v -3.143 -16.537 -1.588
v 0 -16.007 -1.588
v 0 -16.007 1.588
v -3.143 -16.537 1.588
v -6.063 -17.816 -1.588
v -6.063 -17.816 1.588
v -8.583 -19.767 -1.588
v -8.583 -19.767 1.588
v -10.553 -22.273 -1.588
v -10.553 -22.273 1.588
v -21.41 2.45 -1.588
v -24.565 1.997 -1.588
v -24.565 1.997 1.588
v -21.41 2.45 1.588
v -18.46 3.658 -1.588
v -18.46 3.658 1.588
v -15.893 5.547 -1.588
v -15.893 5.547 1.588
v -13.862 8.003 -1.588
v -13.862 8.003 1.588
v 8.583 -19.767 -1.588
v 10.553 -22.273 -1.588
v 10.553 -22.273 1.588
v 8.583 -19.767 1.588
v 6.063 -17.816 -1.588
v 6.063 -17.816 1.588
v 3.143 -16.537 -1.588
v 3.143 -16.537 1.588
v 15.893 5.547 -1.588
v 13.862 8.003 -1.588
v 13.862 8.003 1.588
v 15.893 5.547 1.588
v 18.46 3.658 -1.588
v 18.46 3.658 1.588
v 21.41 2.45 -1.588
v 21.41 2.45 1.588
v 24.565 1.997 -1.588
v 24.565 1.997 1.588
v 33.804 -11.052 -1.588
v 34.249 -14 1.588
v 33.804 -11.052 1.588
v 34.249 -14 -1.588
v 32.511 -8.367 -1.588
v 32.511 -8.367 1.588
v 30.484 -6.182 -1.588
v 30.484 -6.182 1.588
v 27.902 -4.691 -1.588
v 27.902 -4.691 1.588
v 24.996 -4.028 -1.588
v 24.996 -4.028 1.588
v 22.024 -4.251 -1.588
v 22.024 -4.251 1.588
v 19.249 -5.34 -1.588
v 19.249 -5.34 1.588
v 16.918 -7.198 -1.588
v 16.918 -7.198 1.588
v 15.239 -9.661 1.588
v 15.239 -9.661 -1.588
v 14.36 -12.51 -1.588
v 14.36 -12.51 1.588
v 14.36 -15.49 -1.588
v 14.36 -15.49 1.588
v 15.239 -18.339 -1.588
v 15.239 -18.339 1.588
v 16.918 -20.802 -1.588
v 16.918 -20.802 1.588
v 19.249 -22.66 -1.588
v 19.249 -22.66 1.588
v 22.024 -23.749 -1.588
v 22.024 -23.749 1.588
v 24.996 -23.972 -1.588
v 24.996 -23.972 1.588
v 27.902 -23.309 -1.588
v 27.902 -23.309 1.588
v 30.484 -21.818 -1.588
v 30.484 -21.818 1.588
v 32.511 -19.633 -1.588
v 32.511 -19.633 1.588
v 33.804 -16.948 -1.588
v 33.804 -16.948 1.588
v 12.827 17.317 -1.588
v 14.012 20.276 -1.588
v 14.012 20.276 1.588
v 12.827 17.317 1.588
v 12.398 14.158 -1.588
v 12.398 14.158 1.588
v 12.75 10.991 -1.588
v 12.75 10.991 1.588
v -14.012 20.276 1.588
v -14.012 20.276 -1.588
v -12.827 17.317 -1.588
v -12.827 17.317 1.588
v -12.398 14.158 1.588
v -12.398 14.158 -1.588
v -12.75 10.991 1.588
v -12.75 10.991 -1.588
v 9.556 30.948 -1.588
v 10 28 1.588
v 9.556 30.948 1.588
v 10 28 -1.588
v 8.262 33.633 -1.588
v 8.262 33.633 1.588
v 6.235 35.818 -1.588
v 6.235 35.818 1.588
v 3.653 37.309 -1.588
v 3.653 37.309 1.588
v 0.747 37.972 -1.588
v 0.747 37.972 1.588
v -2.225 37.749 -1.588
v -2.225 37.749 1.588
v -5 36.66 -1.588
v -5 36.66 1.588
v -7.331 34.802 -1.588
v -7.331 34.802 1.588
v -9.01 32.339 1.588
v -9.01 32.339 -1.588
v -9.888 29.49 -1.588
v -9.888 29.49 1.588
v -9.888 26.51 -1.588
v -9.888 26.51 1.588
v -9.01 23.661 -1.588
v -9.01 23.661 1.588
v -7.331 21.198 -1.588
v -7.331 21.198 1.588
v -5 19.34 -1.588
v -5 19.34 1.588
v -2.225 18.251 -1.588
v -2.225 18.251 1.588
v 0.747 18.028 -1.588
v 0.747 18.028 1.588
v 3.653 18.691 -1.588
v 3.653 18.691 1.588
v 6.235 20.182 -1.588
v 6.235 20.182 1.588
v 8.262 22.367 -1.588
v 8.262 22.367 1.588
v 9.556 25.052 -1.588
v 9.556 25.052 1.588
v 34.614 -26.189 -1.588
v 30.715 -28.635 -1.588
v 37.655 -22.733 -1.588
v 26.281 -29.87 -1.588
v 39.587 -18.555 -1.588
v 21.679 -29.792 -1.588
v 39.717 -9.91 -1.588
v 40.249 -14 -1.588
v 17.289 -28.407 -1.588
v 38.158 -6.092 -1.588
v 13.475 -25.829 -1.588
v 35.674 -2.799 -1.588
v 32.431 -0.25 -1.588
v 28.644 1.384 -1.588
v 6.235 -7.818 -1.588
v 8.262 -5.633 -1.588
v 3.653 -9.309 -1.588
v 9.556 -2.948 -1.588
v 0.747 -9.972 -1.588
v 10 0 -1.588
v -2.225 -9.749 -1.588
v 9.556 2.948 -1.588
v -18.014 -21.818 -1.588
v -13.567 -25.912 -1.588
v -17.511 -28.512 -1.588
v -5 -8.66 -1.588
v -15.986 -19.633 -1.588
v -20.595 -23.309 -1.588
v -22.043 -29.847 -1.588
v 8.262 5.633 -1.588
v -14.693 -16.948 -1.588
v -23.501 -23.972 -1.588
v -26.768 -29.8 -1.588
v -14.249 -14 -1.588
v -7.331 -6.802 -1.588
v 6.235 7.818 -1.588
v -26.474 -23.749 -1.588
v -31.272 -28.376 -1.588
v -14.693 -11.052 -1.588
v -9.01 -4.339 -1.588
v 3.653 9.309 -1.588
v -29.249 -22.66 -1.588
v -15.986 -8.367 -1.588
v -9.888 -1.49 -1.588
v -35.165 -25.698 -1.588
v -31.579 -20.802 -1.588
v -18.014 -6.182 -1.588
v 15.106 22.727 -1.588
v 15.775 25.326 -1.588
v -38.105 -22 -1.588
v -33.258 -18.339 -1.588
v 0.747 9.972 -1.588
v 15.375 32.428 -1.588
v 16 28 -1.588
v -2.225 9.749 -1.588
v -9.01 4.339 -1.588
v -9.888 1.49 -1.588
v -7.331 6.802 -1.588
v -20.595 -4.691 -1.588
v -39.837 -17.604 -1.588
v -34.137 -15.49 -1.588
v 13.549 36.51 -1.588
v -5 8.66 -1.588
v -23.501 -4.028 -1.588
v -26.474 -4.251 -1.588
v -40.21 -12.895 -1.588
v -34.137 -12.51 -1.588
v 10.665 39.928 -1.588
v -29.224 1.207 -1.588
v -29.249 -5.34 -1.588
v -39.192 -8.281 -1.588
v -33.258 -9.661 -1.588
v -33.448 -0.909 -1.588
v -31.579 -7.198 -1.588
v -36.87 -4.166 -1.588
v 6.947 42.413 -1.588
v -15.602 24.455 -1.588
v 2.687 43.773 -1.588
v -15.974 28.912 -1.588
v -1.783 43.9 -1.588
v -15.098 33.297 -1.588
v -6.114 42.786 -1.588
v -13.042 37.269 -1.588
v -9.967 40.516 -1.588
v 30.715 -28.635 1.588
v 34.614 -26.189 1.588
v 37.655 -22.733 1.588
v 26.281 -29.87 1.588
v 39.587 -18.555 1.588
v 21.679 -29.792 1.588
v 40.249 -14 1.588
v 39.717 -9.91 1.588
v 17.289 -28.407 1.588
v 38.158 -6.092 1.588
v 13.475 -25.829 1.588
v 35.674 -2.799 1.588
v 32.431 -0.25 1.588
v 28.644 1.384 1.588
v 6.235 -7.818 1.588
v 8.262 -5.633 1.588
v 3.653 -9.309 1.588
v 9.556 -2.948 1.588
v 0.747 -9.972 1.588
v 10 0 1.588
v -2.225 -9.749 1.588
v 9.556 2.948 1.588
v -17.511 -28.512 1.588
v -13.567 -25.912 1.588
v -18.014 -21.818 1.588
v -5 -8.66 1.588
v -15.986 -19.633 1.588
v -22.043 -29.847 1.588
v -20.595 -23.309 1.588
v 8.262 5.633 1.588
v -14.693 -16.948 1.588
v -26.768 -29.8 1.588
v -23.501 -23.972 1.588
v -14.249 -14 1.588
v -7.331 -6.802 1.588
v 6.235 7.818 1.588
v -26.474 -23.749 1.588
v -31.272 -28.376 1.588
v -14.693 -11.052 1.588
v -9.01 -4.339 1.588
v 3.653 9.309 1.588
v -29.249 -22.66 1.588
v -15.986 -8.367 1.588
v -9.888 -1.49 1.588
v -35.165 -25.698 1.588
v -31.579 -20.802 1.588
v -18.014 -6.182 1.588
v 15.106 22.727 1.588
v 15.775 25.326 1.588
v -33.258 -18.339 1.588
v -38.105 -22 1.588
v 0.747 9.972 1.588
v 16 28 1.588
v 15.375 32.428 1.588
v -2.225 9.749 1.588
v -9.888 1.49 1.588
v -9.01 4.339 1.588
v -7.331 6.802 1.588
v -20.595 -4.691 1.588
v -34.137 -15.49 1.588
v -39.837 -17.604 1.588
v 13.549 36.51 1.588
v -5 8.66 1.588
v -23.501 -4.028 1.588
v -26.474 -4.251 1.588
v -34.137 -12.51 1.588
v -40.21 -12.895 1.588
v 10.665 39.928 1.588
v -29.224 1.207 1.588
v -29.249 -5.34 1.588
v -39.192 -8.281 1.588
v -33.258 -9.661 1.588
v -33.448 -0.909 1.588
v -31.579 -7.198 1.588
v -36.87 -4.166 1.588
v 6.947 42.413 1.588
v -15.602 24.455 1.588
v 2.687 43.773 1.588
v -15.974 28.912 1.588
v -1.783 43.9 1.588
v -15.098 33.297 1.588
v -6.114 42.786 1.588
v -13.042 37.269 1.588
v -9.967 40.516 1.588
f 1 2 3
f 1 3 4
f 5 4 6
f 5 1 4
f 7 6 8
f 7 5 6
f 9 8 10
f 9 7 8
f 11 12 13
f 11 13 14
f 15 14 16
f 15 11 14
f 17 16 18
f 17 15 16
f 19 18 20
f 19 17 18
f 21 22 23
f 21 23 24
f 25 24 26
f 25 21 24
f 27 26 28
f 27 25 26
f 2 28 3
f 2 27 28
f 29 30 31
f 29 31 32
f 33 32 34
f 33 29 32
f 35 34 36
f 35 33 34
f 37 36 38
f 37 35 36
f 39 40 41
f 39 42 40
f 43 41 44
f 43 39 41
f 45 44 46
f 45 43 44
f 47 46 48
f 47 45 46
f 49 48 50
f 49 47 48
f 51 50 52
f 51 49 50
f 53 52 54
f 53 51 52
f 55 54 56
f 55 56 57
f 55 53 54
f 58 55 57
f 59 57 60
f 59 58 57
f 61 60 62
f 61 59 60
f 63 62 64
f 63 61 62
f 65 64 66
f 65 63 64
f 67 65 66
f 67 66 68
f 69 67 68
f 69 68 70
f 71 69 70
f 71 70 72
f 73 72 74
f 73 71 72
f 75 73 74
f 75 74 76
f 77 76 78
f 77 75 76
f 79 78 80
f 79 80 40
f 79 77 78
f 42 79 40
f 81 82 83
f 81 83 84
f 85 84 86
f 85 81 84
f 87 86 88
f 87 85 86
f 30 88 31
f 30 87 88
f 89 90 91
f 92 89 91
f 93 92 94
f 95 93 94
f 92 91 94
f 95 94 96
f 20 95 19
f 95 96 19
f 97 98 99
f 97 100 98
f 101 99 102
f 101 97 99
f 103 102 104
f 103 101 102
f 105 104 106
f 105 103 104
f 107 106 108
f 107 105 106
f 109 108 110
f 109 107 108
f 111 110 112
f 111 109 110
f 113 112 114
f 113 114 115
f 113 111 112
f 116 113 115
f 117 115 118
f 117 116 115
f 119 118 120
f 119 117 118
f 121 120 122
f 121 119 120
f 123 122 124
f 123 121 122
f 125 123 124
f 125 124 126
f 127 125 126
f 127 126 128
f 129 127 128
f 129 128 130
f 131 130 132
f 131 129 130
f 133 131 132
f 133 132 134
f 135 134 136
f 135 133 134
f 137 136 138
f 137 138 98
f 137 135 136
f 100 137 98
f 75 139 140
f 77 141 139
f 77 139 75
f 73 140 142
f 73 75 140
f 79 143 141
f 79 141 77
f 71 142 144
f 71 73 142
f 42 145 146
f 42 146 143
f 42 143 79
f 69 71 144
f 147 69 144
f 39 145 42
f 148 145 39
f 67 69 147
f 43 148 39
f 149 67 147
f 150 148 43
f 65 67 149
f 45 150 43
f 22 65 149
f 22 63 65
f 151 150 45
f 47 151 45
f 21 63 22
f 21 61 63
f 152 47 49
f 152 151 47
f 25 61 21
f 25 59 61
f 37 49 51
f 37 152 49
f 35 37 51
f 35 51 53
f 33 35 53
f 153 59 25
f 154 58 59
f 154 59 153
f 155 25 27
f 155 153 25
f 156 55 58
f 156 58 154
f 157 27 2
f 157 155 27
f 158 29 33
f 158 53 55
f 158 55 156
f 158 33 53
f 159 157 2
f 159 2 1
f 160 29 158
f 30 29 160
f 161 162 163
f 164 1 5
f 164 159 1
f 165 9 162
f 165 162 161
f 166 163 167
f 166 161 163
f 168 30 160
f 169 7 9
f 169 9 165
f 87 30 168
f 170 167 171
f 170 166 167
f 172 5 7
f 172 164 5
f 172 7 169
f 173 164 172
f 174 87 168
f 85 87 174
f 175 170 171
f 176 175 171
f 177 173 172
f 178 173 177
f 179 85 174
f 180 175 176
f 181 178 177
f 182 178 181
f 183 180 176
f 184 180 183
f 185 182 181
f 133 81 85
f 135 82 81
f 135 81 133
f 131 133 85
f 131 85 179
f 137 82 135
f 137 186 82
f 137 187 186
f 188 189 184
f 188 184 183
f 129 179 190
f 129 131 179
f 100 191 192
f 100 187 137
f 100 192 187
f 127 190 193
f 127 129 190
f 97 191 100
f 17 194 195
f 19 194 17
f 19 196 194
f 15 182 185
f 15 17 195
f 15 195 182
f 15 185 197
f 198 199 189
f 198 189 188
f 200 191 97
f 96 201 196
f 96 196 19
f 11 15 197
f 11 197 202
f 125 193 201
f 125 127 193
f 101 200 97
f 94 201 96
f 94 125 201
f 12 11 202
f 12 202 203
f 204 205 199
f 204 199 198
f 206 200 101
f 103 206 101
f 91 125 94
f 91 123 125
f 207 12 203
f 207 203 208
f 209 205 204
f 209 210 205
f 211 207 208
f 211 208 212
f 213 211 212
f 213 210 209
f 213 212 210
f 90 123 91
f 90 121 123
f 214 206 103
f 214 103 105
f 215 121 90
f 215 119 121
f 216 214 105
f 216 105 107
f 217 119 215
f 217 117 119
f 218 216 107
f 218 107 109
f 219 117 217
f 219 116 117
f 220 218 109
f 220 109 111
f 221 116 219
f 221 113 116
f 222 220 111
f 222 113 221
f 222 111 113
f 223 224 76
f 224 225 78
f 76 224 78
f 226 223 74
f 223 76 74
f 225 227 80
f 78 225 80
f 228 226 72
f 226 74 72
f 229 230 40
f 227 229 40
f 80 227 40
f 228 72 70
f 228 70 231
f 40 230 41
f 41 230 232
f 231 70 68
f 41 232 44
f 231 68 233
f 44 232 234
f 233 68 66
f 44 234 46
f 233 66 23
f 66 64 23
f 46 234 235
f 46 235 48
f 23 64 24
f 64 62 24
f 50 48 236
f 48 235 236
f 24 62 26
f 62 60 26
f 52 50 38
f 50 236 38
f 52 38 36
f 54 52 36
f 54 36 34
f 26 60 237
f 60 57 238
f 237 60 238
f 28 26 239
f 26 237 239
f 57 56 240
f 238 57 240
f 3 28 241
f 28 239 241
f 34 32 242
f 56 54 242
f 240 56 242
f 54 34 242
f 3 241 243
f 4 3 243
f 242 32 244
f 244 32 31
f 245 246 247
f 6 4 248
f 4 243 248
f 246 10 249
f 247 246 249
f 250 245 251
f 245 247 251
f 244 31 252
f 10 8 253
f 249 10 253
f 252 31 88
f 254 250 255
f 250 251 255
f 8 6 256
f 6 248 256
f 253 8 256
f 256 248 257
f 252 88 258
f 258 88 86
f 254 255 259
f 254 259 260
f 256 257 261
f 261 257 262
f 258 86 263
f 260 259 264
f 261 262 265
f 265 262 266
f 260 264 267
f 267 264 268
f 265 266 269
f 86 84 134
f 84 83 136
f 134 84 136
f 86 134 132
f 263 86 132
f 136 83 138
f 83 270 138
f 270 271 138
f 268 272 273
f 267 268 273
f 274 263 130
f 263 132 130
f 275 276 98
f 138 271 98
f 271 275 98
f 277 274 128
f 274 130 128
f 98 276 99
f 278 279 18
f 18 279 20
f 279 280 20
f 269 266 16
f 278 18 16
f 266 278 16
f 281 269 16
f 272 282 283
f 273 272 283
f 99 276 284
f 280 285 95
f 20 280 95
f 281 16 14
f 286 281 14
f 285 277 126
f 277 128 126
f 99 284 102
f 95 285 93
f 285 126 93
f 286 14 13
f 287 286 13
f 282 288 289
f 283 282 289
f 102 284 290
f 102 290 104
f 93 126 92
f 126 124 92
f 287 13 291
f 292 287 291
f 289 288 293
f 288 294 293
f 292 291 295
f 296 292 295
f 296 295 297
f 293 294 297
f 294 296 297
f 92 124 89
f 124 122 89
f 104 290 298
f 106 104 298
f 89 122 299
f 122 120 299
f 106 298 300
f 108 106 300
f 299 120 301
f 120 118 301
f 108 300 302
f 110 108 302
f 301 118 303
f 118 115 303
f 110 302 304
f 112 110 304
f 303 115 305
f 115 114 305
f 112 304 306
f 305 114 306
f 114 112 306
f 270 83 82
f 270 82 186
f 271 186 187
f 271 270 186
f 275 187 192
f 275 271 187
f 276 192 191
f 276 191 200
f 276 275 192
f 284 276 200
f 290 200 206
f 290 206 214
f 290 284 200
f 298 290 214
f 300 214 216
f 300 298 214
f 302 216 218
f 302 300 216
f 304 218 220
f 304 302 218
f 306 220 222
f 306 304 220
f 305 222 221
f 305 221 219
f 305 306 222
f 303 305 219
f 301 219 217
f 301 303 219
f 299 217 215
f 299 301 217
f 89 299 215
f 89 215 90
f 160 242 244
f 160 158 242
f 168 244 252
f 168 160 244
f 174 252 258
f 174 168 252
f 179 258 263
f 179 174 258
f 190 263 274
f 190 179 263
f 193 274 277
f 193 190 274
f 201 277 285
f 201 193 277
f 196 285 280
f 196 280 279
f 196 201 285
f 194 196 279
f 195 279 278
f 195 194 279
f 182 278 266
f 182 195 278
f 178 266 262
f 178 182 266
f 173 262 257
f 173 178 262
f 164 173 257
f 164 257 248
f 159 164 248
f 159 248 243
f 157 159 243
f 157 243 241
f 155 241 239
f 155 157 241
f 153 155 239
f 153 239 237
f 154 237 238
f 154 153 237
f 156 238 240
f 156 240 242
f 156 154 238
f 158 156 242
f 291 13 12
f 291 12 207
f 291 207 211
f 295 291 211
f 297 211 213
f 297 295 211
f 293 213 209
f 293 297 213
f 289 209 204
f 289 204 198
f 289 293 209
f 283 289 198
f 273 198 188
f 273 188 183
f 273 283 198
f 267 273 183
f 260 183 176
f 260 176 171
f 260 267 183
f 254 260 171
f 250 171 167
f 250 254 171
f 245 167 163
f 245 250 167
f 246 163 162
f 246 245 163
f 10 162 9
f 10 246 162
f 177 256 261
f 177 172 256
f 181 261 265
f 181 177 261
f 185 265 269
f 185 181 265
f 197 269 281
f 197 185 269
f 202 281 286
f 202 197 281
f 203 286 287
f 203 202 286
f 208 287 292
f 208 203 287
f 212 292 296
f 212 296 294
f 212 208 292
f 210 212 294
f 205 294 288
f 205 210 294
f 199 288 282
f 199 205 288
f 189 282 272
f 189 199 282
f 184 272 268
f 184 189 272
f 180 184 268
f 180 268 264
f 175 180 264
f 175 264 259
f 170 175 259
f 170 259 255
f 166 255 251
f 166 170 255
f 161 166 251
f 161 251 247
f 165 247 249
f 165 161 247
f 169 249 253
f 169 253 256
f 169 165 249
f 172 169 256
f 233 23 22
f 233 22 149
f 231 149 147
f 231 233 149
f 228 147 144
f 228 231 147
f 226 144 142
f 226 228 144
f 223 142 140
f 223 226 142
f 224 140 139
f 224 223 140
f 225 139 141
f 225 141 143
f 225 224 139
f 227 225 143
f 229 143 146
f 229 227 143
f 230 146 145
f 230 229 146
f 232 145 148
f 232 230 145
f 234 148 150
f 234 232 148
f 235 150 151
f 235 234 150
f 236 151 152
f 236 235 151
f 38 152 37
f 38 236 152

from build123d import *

# Parameters (mm, degrees)
F2_R        = 10
F3_DEPTH    = 1.5875
F4_T1_DEPTH = 3.175


# Not quite as in the source:
# - a fillet or chamfer that OpenCascade refuses, or shapes differently, is made with other operations: its cross-section is extruded or revolved along the edge and cut away or added


with BuildPart() as f3:
    # F2 (on Top) → F3 (new body, symmetric)
    with BuildSketch(Plane.XY):
        with BuildLine():
            ThreePointArc((7.7459666924, 14), (13.7828782748, 19.8739759746), (16, 28))
            ThreePointArc((16, 28), (-8.1260240254, 41.7828782748), (-7.7459666924, 14))
            ThreePointArc((-7.7459666924, 14), (0, 16), (7.7459666924, 14))
        make_face()
        with Locations((0, 28)):
            Circle(F2_R, mode=Mode.SUBTRACT)
        with BuildLine():
            ThreePointArc((7.7459666924, 14), (0, 12), (-7.7459666924, 14))
            ThreePointArc((-7.7459666924, 14), (-13.8564064606, 8), (-15.9973389992, -0.2917960675))
            ThreePointArc((-15.9973389992, -0.2917960675), (-10.3923048454, -6), (-8.2513723068, -13.7082039325))
            ThreePointArc((-8.2513723068, -13.7082039325), (0, -16), (8.2513723068, -13.7082039325))
            ThreePointArc((8.2513723068, -13.7082039325), (10.3923048454, -6), (15.9973389992, -0.2917960675))
            ThreePointArc((15.9973389992, -0.2917960675), (15.999334736, -0.1459041003), (16, 0))
            ThreePointArc((16, 0), (13.7828782748, 8.1260240254), (7.7459666924, 14))
        make_face()
        Circle(F2_R, mode=Mode.SUBTRACT)
        with BuildLine():
            ThreePointArc((-8.2513723068, -13.7082039325), (-13.8564064606, -8), (-15.9973389992, -0.2917960675))
            ThreePointArc((-15.9973389992, -0.2917960675), (-38.1774936811, -21.8733107106), (-8.248711306, -14))
            ThreePointArc((-8.248711306, -14), (-8.24937657, -13.8540958997), (-8.2513723068, -13.7082039325))
        make_face()
        with Locations((-24.248711306, -14)):
            Circle(F2_R, mode=Mode.SUBTRACT)
        with BuildLine():
            ThreePointArc((-8.2513723068, -13.7082039325), (-10.3923048454, -6), (-15.9973389992, -0.2917960675))
            ThreePointArc((-15.9973389992, -0.2917960675), (-13.8564064606, -8), (-8.2513723068, -13.7082039325))
        make_face()
        with BuildLine():
            ThreePointArc((7.7459666924, 14), (0, 16), (-7.7459666924, 14))
            ThreePointArc((-7.7459666924, 14), (0, 12), (7.7459666924, 14))
        make_face()
        with BuildLine():
            ThreePointArc((8.2513723068, -13.7082039325), (13.8564064606, -8), (15.9973389992, -0.2917960675))
            ThreePointArc((15.9973389992, -0.2917960675), (10.3923048454, -6), (8.2513723068, -13.7082039325))
        make_face()
        with BuildLine():
            ThreePointArc((40.248711306, -14), (32.1220220166, -0.0712176249), (15.9973389992, -0.2917960675))
            ThreePointArc((15.9973389992, -0.2917960675), (13.8564064606, -8), (8.2513723068, -13.7082039325))
            ThreePointArc((8.2513723068, -13.7082039325), (24.1028072057, -29.999334736), (40.248711306, -14))
        make_face()
        with Locations((24.248711306, -14)):
            Circle(F2_R, mode=Mode.SUBTRACT)
    extrude(amount=F3_DEPTH, both=True)

    # F4: fillet of radius 13 on 6 edges, made by hand

    # F4_s2 → F4_t1 (join)
    with BuildSketch(Plane.XY.offset(-1.5875)):
        with BuildLine():
            ThreePointArc((14.0120552819, 20.275862069), (12.3968501984, 14), (14.0120552819, 7.724137931))
            ThreePointArc((14.0120552819, 7.724137931), (11.3225214169, 11.3048887108), (7.7459666924, 14))
            ThreePointArc((7.7459666924, 14), (11.3225214169, 16.6951112892), (14.0120552819, 20.275862069))
        make_face()
        with BuildLine():
            ThreePointArc((13.6953273115, 8.2727268678), (18.3227807522, 3.7359871987), (24.5654392763, 1.9968647989))
            ThreePointArc((24.5654392763, 1.9968647989), (20.1196512039, 1.4580355373), (15.9973389992, -0.2917960675))
            ThreePointArc((15.9973389992, -0.2917960675), (15.451581519, 4.1531468265), (13.6953273115, 8.2727268678))
        make_face()
        with BuildLine():
            ThreePointArc((10.5533839944, -22.2727268678), (5.9259305538, -17.7359871987), (-0.3167279703, -15.9968647989))
            ThreePointArc((-0.3167279703, -15.9968647989), (4.1290601021, -15.4580355373), (8.2513723068, -13.7082039325))
            ThreePointArc((8.2513723068, -13.7082039325), (8.797129787, -18.1531468265), (10.5533839944, -22.2727268678))
        make_face()
        with BuildLine():
            ThreePointArc((0.3167279703, -15.9968647989), (-5.9259305538, -17.7359871987), (-10.5533839944, -22.2727268678))
            ThreePointArc((-10.5533839944, -22.2727268678), (-8.797129787, -18.1531468265), (-8.2513723068, -13.7082039325))
            ThreePointArc((-8.2513723068, -13.7082039325), (-4.1290601021, -15.4580355373), (0.3167279703, -15.9968647989))
        make_face()
        with BuildLine():
            ThreePointArc((-24.5654392763, 1.9968647989), (-18.3227807522, 3.7359871987), (-13.6953273115, 8.2727268678))
            ThreePointArc((-13.6953273115, 8.2727268678), (-15.451581519, 4.1531468265), (-15.9973389992, -0.2917960675))
            ThreePointArc((-15.9973389992, -0.2917960675), (-20.1196512039, 1.4580355373), (-24.5654392763, 1.9968647989))
        make_face()
        with BuildLine():
            ThreePointArc((-14.0120552819, 20.275862069), (-12.3968501984, 14), (-14.0120552819, 7.724137931))
            ThreePointArc((-14.0120552819, 7.724137931), (-11.3225214169, 11.3048887108), (-7.7459666924, 14))
            ThreePointArc((-7.7459666924, 14), (-11.3225214169, 16.6951112892), (-14.0120552819, 20.275862069))
        make_face()
    extrude(amount=F4_T1_DEPTH)


solid = f3.part
